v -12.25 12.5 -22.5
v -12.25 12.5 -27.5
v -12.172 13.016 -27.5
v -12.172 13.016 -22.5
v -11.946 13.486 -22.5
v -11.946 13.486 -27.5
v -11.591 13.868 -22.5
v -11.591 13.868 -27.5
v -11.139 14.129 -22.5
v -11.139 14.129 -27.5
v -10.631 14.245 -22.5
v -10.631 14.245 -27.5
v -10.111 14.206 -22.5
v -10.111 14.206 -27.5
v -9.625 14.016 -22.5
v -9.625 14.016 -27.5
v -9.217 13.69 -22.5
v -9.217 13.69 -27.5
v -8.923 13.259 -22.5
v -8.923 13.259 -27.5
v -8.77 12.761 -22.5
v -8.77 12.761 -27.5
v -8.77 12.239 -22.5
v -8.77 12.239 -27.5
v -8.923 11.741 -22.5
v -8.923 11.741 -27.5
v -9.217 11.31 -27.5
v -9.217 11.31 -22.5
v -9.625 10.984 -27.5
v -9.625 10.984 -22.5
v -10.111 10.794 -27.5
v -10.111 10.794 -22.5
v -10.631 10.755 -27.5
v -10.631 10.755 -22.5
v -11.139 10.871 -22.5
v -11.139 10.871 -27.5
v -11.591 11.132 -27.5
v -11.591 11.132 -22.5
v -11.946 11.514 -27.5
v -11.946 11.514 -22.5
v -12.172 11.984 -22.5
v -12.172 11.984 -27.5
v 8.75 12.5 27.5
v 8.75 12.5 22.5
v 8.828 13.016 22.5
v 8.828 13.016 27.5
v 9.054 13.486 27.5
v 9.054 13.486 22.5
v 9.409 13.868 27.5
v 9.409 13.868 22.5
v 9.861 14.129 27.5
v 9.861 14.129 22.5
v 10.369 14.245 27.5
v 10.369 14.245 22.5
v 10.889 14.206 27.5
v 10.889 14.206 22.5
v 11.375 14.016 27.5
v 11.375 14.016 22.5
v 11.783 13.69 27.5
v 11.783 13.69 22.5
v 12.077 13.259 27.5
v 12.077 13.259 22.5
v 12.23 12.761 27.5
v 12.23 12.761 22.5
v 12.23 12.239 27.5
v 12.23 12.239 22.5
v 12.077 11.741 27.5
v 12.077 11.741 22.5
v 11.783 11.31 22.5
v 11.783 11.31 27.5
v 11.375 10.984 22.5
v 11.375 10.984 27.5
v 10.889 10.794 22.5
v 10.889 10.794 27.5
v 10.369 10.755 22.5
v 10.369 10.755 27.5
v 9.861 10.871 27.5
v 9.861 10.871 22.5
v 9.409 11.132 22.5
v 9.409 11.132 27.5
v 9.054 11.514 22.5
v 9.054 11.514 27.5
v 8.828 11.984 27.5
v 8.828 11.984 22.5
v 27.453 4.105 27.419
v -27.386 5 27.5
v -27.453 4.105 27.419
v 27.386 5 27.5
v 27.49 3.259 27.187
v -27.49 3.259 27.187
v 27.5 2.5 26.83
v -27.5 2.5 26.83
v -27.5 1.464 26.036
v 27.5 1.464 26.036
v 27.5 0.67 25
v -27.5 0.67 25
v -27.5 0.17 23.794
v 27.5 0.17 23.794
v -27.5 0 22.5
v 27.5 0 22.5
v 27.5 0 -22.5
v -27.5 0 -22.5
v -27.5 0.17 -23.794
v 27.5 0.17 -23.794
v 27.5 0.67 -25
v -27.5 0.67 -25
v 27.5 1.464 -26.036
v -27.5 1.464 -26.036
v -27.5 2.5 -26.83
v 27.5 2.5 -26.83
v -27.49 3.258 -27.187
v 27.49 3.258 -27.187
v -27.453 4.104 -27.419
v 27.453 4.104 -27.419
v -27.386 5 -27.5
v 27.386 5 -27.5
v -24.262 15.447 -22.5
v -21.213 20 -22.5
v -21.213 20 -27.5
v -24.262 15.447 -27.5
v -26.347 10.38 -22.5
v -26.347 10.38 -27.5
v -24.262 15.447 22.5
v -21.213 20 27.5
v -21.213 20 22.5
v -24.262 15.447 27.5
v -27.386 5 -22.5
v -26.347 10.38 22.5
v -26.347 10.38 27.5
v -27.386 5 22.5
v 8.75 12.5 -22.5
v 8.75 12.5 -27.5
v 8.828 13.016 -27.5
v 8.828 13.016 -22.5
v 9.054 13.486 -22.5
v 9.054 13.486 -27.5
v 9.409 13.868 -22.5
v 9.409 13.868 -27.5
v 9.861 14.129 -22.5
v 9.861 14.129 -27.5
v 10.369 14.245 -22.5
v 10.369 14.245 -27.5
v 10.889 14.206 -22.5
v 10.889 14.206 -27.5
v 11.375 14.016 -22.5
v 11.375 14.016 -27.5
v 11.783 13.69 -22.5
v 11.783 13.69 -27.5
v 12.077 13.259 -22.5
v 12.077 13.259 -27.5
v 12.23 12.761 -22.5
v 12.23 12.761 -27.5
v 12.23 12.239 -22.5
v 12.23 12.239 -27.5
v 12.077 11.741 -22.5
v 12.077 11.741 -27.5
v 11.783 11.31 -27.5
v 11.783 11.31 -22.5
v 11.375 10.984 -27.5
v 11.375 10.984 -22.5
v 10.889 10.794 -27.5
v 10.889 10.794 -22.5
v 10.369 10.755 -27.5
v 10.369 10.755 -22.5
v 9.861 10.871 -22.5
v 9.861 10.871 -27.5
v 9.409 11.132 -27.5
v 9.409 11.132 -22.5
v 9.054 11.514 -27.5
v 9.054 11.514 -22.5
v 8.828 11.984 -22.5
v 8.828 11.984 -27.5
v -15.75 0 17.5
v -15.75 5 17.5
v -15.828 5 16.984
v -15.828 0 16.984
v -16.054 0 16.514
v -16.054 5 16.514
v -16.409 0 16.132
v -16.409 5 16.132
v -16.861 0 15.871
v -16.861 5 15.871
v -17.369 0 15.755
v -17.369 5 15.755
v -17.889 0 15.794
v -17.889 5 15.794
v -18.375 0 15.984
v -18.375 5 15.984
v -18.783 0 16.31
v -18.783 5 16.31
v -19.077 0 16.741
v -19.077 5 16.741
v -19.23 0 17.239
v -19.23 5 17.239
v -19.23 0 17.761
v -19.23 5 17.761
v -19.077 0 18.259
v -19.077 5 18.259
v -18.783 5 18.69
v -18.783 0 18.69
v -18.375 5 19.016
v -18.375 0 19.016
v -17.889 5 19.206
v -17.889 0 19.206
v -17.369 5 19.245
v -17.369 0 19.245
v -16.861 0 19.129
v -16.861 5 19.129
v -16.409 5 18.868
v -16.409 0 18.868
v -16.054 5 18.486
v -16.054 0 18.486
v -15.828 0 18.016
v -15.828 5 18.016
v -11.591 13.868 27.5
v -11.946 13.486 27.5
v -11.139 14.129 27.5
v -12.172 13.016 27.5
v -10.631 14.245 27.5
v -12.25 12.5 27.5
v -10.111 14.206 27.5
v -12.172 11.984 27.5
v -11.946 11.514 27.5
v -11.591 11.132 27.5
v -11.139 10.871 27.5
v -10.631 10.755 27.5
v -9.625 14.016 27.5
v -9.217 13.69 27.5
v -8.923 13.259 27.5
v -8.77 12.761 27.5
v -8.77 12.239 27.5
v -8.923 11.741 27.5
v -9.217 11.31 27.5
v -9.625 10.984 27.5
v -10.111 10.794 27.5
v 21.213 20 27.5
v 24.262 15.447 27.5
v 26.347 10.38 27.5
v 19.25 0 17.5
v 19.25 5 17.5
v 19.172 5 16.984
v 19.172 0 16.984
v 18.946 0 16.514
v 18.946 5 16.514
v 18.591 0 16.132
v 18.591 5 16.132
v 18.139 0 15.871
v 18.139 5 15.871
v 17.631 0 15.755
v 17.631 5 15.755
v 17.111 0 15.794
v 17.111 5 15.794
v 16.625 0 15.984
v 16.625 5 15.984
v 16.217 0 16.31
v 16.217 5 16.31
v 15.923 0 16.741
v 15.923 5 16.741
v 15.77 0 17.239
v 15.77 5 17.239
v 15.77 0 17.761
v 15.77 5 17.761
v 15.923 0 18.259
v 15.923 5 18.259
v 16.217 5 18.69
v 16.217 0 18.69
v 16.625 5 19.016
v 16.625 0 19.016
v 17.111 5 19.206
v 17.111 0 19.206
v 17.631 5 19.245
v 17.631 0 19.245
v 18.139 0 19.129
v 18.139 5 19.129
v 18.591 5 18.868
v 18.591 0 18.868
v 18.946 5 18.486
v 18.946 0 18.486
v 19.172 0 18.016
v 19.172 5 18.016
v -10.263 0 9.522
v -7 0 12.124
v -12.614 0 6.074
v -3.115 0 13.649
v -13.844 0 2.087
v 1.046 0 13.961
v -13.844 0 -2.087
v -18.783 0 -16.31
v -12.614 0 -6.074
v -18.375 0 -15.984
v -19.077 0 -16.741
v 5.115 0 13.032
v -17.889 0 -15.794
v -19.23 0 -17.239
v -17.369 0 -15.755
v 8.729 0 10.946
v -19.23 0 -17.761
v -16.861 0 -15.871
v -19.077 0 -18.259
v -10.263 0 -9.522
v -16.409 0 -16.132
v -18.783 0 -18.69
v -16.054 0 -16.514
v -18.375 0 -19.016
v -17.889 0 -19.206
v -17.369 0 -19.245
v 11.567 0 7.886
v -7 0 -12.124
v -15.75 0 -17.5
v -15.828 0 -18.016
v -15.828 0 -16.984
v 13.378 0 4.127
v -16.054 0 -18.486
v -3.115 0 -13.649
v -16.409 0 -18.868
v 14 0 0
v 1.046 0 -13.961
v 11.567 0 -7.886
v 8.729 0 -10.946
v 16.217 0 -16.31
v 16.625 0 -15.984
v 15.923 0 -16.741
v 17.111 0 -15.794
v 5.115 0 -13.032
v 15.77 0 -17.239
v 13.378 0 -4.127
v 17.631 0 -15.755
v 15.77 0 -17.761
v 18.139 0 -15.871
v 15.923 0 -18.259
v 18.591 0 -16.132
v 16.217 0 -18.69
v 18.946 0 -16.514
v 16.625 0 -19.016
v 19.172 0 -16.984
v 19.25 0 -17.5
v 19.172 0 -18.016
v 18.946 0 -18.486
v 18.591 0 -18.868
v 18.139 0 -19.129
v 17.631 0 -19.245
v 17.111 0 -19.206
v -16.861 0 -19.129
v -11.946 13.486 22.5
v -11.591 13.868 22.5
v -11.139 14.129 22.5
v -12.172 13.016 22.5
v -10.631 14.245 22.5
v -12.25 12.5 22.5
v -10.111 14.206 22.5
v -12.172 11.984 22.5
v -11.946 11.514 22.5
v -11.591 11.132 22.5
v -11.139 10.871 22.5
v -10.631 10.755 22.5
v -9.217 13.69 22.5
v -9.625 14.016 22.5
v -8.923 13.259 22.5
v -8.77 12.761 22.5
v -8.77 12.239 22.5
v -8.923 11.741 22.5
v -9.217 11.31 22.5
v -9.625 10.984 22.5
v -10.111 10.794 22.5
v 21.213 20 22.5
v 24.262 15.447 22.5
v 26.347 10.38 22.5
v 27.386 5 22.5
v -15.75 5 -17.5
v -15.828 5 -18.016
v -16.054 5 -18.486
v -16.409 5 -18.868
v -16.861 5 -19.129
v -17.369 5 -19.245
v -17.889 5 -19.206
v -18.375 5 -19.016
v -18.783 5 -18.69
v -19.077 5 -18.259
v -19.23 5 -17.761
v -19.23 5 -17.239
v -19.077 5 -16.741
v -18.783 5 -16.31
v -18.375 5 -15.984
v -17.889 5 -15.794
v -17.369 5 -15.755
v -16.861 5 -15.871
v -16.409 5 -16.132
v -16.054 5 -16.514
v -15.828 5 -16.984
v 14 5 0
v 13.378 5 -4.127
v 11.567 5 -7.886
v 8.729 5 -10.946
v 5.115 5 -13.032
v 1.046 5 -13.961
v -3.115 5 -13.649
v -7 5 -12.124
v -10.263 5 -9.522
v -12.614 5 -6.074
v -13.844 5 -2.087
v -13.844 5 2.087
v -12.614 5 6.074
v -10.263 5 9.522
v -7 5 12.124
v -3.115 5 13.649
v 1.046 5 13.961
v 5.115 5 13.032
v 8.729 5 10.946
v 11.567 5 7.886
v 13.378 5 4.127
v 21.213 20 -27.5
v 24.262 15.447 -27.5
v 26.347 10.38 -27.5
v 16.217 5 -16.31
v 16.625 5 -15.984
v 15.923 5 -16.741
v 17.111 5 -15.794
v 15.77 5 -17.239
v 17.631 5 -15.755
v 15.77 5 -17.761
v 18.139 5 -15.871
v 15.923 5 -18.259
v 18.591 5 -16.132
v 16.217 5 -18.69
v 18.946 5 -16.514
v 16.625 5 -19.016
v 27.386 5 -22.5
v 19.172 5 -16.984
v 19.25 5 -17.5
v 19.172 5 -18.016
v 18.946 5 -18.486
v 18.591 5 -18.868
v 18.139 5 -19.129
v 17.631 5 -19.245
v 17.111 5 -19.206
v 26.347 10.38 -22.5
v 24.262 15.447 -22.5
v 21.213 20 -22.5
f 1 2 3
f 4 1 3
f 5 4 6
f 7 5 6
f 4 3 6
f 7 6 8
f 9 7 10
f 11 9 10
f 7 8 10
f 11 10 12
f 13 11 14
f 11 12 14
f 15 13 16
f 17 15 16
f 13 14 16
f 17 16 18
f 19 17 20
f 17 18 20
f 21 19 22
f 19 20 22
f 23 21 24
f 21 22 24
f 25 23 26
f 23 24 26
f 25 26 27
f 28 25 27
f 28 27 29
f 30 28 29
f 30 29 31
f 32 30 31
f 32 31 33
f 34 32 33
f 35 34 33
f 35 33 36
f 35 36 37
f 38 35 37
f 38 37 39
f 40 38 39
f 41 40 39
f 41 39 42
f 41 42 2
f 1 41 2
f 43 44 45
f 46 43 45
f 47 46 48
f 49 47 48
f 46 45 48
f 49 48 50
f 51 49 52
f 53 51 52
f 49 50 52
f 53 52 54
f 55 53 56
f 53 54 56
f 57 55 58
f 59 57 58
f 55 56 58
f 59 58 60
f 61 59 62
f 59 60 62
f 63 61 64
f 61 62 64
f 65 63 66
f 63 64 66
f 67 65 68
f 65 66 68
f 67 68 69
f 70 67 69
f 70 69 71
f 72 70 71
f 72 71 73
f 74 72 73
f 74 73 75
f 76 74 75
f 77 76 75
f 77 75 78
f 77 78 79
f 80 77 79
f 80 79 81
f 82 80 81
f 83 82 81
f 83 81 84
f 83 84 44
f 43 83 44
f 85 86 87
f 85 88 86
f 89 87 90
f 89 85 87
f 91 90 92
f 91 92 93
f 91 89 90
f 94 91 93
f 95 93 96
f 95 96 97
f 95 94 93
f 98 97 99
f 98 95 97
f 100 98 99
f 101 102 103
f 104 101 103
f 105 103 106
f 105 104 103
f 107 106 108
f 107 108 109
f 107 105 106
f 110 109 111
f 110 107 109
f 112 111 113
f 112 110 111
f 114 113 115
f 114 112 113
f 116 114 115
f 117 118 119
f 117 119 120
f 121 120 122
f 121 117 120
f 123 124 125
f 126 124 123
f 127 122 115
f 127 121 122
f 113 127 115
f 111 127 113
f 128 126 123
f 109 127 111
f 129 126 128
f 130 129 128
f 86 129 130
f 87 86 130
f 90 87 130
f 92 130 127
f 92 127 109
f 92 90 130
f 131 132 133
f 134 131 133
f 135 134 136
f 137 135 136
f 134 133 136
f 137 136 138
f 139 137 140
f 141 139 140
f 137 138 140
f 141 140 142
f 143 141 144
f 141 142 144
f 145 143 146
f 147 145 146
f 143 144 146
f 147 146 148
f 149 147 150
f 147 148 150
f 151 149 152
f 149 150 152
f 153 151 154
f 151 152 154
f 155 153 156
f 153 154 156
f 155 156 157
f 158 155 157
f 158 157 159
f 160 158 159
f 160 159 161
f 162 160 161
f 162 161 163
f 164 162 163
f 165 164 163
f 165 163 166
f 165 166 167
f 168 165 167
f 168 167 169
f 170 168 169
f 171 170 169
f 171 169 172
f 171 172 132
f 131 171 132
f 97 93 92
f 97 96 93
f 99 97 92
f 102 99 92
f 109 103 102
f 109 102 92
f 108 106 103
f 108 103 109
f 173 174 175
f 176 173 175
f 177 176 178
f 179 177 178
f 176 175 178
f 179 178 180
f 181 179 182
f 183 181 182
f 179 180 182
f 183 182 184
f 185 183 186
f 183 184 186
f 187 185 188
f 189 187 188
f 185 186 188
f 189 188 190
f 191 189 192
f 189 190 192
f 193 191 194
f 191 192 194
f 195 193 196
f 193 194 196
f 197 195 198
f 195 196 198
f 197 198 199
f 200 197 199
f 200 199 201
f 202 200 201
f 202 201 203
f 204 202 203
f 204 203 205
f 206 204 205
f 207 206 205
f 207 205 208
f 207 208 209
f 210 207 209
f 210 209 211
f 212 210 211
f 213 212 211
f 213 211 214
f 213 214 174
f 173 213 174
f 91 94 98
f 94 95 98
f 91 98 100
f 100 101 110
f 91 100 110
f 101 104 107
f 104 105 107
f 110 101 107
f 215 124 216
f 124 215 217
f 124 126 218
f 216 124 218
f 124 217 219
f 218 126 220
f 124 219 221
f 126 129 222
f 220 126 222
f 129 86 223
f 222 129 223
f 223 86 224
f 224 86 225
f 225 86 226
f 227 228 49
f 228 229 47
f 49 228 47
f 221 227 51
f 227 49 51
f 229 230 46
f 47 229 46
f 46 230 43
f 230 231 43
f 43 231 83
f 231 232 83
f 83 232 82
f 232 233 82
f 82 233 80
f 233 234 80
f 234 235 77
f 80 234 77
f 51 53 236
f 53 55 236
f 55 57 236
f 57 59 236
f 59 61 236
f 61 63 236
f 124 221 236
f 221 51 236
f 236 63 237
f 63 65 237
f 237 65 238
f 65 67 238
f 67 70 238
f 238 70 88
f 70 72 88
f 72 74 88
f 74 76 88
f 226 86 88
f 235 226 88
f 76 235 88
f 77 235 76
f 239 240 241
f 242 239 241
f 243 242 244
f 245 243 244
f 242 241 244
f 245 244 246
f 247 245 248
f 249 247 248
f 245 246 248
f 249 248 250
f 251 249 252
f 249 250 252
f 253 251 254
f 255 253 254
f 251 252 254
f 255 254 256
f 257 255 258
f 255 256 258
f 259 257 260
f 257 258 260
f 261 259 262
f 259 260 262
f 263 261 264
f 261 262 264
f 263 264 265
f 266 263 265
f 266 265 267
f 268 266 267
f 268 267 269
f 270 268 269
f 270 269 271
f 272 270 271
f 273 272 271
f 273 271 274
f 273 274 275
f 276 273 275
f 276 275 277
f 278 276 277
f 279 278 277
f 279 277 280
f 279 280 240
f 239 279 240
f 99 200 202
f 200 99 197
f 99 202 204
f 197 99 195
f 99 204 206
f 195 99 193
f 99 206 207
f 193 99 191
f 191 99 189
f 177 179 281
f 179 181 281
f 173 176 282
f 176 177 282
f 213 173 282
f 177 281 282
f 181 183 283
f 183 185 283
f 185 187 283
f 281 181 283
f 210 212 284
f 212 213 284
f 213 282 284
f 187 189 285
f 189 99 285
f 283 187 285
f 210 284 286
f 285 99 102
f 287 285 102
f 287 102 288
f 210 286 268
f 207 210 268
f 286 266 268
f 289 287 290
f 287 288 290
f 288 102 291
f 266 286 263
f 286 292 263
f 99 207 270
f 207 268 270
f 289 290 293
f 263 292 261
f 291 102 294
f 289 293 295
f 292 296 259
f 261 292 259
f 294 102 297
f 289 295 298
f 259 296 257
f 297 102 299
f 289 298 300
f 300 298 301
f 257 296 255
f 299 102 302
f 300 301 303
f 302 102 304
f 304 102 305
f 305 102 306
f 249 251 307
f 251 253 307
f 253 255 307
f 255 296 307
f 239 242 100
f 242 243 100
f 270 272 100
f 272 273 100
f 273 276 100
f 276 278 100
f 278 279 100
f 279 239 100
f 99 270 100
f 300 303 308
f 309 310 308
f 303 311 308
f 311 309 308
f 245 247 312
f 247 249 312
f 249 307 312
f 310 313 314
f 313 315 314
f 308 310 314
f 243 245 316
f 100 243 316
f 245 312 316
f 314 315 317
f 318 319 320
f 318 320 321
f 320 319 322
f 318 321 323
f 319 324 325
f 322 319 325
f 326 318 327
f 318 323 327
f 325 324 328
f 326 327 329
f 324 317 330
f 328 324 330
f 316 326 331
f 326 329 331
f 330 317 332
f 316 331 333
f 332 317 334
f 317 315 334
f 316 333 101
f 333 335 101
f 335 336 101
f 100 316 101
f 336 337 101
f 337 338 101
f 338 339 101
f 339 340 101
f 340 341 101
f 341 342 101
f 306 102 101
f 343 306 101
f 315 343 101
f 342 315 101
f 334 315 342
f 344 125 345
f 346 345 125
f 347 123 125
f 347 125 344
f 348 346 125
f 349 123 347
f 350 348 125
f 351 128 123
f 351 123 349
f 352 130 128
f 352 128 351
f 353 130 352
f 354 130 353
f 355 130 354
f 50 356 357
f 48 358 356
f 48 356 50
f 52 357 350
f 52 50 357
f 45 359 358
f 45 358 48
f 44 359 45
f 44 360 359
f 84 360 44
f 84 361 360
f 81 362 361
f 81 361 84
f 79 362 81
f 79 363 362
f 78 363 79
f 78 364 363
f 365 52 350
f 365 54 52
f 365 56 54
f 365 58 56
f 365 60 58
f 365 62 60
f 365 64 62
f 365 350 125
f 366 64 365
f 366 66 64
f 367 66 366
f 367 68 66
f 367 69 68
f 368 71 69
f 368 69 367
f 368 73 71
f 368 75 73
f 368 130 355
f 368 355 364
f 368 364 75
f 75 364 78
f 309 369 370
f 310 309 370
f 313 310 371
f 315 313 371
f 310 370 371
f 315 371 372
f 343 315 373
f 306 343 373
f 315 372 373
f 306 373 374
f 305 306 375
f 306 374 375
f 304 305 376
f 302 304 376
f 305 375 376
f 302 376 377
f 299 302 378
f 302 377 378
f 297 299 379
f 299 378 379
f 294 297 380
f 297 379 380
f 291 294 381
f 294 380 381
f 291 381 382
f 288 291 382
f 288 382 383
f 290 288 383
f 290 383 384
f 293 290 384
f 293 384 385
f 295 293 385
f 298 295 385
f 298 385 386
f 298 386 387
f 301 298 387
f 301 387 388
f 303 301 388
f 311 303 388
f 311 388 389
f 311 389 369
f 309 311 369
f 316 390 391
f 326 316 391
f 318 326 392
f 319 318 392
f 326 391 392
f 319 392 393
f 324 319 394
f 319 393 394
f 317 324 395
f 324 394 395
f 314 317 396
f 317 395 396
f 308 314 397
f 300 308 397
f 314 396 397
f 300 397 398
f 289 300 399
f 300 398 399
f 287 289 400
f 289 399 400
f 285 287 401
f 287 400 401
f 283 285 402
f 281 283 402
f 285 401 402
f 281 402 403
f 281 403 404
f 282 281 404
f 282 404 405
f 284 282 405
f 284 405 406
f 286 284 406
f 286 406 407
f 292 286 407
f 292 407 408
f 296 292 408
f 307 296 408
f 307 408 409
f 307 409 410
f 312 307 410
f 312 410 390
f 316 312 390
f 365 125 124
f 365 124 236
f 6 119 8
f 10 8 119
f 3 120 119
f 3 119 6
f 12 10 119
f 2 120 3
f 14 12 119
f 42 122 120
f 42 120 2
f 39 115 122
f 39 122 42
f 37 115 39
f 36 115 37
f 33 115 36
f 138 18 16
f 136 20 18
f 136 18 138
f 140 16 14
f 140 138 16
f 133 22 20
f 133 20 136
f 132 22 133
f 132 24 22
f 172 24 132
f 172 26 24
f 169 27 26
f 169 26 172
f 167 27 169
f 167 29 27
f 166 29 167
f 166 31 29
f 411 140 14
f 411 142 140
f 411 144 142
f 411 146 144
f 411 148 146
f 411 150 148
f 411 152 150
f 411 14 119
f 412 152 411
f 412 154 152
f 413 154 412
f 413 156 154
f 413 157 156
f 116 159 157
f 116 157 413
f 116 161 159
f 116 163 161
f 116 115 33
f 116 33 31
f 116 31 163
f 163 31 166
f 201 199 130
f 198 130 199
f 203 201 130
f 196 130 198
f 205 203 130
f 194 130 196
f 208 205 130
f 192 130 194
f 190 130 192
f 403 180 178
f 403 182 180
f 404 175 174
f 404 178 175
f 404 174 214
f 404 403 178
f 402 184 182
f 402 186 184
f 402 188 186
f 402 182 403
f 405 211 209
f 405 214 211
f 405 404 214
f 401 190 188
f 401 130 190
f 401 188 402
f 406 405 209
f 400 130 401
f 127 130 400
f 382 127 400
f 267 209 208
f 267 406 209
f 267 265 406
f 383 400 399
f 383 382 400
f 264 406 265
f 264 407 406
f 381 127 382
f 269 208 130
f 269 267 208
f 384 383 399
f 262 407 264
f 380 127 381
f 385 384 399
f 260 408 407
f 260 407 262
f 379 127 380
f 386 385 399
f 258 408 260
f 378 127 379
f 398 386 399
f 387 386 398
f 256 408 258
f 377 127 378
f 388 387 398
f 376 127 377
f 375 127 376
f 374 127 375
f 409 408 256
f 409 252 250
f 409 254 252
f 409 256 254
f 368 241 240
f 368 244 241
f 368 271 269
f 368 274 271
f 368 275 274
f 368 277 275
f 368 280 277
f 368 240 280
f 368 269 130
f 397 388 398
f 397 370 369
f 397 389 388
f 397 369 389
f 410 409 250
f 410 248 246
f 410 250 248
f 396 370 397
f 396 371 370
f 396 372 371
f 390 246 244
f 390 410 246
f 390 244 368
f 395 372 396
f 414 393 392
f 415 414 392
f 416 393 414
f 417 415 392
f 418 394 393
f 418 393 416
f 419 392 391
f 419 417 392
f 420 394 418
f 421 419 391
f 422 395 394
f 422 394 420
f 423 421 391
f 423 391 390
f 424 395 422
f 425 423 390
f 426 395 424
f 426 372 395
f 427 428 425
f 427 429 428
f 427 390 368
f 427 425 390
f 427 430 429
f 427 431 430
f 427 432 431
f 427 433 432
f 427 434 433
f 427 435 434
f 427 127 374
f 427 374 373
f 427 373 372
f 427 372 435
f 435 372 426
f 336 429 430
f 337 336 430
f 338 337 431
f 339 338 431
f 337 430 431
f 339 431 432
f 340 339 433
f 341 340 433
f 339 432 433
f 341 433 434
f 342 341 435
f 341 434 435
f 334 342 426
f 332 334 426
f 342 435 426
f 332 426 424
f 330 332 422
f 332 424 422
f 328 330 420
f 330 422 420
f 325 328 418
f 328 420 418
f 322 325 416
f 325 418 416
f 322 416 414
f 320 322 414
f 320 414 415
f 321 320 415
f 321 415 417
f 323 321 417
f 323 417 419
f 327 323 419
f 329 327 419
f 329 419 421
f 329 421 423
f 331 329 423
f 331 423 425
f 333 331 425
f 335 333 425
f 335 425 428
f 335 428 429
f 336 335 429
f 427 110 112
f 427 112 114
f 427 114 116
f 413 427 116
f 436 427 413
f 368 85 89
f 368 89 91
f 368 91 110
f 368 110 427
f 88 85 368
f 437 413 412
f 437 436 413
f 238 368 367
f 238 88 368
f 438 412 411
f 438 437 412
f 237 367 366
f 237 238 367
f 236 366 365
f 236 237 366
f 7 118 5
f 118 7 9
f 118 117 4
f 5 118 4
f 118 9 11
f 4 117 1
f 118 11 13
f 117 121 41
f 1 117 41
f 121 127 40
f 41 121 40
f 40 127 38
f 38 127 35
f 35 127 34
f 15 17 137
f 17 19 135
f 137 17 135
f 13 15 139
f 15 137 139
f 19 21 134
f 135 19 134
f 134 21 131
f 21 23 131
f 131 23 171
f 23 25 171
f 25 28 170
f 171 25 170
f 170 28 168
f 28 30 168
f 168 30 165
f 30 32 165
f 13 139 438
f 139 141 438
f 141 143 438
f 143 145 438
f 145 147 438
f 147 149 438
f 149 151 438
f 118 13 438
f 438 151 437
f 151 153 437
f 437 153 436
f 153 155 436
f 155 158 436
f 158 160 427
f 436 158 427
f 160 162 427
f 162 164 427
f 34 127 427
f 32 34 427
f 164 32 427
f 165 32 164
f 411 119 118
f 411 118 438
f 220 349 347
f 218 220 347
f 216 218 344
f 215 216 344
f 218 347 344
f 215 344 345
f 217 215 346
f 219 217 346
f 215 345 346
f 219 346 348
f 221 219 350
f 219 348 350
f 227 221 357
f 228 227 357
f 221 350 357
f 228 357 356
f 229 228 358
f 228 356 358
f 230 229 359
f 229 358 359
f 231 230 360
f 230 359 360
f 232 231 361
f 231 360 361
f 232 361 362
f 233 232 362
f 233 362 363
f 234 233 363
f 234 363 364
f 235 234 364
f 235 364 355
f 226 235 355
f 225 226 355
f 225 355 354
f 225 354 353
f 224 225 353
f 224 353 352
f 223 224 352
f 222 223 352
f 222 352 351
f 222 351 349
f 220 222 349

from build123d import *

# Parameters (mm, degrees)
SKETCH1_W           = 55
SKETCH1_H           = 55
BOSS_EXTRUDE1_DEPTH = 5
CUT_EXTRUDE2_REACH  = 41.211
SKETCH10_R          = 14
SKETCH10_R_2        = 1.75
SKETCH11_W          = 55
SKETCH11_H          = 5
BOSS_EXTRUDE2_DEPTH = 15
FILLET1_R           = 5
SKETCH12_R          = 1.75
CUT_EXTRUDE3_DEPTH  = 65.662585782
CUT_EXTRUDE4_DEPTH  = 65.662585782


with BuildPart() as part:
    # Sketch1 → Boss-Extrude1 (new body)
    with BuildSketch(Plane(origin=(0, 0, 0), x_dir=(1, 0, 0), z_dir=(0, 1, 0))):
        Rectangle(SKETCH1_W, SKETCH1_H)
    extrude(amount=BOSS_EXTRUDE1_DEPTH)

    # Sketch10 → Cut-Extrude2 (cut, up to next)
    with BuildSketch(Plane(origin=(0, 5, 0), x_dir=(1, 0, 0), z_dir=(0, 1, 0)), mode=Mode.PRIVATE) as cut_extrude2_sk1:
        Circle(SKETCH10_R)
    cut_extrude2_tool1 = extrude(cut_extrude2_sk1.sketch, amount=-CUT_EXTRUDE2_REACH, mode=Mode.PRIVATE) & part.part
    # Sketch10 → Cut-Extrude2 (cut, up to next)
    with BuildSketch(Plane(origin=(0, 5, 0), x_dir=(1, 0, 0), z_dir=(0, 1, 0)), mode=Mode.PRIVATE) as cut_extrude2_sk2:
        with Locations((-17.5, 17.5)):
            Circle(SKETCH10_R_2)
    cut_extrude2_tool2 = extrude(cut_extrude2_sk2.sketch, amount=-CUT_EXTRUDE2_REACH, mode=Mode.PRIVATE) & part.part
    # Sketch10 → Cut-Extrude2 (cut, up to next)
    with BuildSketch(Plane(origin=(0, 5, 0), x_dir=(1, 0, 0), z_dir=(0, 1, 0)), mode=Mode.PRIVATE) as cut_extrude2_sk3:
        with Locations((17.5, 17.5)):
            Circle(SKETCH10_R_2)
    cut_extrude2_tool3 = extrude(cut_extrude2_sk3.sketch, amount=-CUT_EXTRUDE2_REACH, mode=Mode.PRIVATE) & part.part
    # Sketch10 → Cut-Extrude2 (cut, up to next)
    with BuildSketch(Plane(origin=(0, 5, 0), x_dir=(1, 0, 0), z_dir=(0, 1, 0)), mode=Mode.PRIVATE) as cut_extrude2_sk4:
        with Locations((17.5, -17.5)):
            Circle(SKETCH10_R_2)
    cut_extrude2_tool4 = extrude(cut_extrude2_sk4.sketch, amount=-CUT_EXTRUDE2_REACH, mode=Mode.PRIVATE) & part.part
    # Sketch10 → Cut-Extrude2 (cut, up to next)
    with BuildSketch(Plane(origin=(0, 5, 0), x_dir=(1, 0, 0), z_dir=(0, 1, 0)), mode=Mode.PRIVATE) as cut_extrude2_sk5:
        with Locations((-17.5, -17.5)):
            Circle(SKETCH10_R_2)
    cut_extrude2_tool5 = extrude(cut_extrude2_sk5.sketch, amount=-CUT_EXTRUDE2_REACH, mode=Mode.PRIVATE) & part.part
    add(cut_extrude2_tool1.solids().sort_by_distance((0, 5, 0))[0], mode=Mode.SUBTRACT)
    add(cut_extrude2_tool2.solids().sort_by_distance((-17.5, 5, -17.5))[0], mode=Mode.SUBTRACT)
    add(cut_extrude2_tool3.solids().sort_by_distance((17.5, 5, -17.5))[0], mode=Mode.SUBTRACT)
    add(cut_extrude2_tool4.solids().sort_by_distance((17.5, 5, 17.5))[0], mode=Mode.SUBTRACT)
    add(cut_extrude2_tool5.solids().sort_by_distance((-17.5, 5, 17.5))[0], mode=Mode.SUBTRACT)

    # Sketch11 → Boss-Extrude2 (add)
    with BuildSketch(Plane(origin=(0, 5, 0), x_dir=(1, 0, 0), z_dir=(0, 1, 0))):
        with Locations((0, 25)):
            Rectangle(SKETCH11_W, SKETCH11_H)
        with Locations((0, -25)):
            Rectangle(SKETCH11_W, SKETCH11_H)
    extrude(amount=BOSS_EXTRUDE2_DEPTH)

    # Fillet1
    fillet1_edges = [part.edges().sort_by_distance(p)[0] for p in [
        (0, 0, -27.5),
        (0, 0, 27.5),
    ]]
    fillet(fillet1_edges, radius=FILLET1_R)

    # Sketch12 → Cut-Extrude3 (cut, through all)
    with BuildSketch(Plane(origin=(0, 0, -27.5), x_dir=(-1, 0, 0), z_dir=(0, 0, -1))):
        with Locations((-10.5, 12.5)):
            Circle(SKETCH12_R)
        with Locations((10.5, 12.5)):
            Circle(SKETCH12_R)
    extrude(amount=-CUT_EXTRUDE3_DEPTH, mode=Mode.SUBTRACT)

    # Sketch13 → Cut-Extrude4 (cut, through all)
    with BuildSketch(Plane.XY.offset(27.5)):
        with BuildLine():
            Line((-27.5, 2.5), (-27.5, 20))
            Line((-27.5, 20), (-21.213203436, 20))
            ThreePointArc((-21.213203436, 20), (-25.880621075, 11.797497123), (-27.5, 2.5))
        make_face()
        with BuildLine():
            Line((21.213203436, 20), (27.5, 20))
            Line((27.5, 20), (27.5, 2.5))
            ThreePointArc((27.5, 2.5), (25.880621075, 11.797497123), (21.213203436, 20))
        make_face()
    extrude(amount=-CUT_EXTRUDE4_DEPTH, mode=Mode.SUBTRACT)


solid = part.part
